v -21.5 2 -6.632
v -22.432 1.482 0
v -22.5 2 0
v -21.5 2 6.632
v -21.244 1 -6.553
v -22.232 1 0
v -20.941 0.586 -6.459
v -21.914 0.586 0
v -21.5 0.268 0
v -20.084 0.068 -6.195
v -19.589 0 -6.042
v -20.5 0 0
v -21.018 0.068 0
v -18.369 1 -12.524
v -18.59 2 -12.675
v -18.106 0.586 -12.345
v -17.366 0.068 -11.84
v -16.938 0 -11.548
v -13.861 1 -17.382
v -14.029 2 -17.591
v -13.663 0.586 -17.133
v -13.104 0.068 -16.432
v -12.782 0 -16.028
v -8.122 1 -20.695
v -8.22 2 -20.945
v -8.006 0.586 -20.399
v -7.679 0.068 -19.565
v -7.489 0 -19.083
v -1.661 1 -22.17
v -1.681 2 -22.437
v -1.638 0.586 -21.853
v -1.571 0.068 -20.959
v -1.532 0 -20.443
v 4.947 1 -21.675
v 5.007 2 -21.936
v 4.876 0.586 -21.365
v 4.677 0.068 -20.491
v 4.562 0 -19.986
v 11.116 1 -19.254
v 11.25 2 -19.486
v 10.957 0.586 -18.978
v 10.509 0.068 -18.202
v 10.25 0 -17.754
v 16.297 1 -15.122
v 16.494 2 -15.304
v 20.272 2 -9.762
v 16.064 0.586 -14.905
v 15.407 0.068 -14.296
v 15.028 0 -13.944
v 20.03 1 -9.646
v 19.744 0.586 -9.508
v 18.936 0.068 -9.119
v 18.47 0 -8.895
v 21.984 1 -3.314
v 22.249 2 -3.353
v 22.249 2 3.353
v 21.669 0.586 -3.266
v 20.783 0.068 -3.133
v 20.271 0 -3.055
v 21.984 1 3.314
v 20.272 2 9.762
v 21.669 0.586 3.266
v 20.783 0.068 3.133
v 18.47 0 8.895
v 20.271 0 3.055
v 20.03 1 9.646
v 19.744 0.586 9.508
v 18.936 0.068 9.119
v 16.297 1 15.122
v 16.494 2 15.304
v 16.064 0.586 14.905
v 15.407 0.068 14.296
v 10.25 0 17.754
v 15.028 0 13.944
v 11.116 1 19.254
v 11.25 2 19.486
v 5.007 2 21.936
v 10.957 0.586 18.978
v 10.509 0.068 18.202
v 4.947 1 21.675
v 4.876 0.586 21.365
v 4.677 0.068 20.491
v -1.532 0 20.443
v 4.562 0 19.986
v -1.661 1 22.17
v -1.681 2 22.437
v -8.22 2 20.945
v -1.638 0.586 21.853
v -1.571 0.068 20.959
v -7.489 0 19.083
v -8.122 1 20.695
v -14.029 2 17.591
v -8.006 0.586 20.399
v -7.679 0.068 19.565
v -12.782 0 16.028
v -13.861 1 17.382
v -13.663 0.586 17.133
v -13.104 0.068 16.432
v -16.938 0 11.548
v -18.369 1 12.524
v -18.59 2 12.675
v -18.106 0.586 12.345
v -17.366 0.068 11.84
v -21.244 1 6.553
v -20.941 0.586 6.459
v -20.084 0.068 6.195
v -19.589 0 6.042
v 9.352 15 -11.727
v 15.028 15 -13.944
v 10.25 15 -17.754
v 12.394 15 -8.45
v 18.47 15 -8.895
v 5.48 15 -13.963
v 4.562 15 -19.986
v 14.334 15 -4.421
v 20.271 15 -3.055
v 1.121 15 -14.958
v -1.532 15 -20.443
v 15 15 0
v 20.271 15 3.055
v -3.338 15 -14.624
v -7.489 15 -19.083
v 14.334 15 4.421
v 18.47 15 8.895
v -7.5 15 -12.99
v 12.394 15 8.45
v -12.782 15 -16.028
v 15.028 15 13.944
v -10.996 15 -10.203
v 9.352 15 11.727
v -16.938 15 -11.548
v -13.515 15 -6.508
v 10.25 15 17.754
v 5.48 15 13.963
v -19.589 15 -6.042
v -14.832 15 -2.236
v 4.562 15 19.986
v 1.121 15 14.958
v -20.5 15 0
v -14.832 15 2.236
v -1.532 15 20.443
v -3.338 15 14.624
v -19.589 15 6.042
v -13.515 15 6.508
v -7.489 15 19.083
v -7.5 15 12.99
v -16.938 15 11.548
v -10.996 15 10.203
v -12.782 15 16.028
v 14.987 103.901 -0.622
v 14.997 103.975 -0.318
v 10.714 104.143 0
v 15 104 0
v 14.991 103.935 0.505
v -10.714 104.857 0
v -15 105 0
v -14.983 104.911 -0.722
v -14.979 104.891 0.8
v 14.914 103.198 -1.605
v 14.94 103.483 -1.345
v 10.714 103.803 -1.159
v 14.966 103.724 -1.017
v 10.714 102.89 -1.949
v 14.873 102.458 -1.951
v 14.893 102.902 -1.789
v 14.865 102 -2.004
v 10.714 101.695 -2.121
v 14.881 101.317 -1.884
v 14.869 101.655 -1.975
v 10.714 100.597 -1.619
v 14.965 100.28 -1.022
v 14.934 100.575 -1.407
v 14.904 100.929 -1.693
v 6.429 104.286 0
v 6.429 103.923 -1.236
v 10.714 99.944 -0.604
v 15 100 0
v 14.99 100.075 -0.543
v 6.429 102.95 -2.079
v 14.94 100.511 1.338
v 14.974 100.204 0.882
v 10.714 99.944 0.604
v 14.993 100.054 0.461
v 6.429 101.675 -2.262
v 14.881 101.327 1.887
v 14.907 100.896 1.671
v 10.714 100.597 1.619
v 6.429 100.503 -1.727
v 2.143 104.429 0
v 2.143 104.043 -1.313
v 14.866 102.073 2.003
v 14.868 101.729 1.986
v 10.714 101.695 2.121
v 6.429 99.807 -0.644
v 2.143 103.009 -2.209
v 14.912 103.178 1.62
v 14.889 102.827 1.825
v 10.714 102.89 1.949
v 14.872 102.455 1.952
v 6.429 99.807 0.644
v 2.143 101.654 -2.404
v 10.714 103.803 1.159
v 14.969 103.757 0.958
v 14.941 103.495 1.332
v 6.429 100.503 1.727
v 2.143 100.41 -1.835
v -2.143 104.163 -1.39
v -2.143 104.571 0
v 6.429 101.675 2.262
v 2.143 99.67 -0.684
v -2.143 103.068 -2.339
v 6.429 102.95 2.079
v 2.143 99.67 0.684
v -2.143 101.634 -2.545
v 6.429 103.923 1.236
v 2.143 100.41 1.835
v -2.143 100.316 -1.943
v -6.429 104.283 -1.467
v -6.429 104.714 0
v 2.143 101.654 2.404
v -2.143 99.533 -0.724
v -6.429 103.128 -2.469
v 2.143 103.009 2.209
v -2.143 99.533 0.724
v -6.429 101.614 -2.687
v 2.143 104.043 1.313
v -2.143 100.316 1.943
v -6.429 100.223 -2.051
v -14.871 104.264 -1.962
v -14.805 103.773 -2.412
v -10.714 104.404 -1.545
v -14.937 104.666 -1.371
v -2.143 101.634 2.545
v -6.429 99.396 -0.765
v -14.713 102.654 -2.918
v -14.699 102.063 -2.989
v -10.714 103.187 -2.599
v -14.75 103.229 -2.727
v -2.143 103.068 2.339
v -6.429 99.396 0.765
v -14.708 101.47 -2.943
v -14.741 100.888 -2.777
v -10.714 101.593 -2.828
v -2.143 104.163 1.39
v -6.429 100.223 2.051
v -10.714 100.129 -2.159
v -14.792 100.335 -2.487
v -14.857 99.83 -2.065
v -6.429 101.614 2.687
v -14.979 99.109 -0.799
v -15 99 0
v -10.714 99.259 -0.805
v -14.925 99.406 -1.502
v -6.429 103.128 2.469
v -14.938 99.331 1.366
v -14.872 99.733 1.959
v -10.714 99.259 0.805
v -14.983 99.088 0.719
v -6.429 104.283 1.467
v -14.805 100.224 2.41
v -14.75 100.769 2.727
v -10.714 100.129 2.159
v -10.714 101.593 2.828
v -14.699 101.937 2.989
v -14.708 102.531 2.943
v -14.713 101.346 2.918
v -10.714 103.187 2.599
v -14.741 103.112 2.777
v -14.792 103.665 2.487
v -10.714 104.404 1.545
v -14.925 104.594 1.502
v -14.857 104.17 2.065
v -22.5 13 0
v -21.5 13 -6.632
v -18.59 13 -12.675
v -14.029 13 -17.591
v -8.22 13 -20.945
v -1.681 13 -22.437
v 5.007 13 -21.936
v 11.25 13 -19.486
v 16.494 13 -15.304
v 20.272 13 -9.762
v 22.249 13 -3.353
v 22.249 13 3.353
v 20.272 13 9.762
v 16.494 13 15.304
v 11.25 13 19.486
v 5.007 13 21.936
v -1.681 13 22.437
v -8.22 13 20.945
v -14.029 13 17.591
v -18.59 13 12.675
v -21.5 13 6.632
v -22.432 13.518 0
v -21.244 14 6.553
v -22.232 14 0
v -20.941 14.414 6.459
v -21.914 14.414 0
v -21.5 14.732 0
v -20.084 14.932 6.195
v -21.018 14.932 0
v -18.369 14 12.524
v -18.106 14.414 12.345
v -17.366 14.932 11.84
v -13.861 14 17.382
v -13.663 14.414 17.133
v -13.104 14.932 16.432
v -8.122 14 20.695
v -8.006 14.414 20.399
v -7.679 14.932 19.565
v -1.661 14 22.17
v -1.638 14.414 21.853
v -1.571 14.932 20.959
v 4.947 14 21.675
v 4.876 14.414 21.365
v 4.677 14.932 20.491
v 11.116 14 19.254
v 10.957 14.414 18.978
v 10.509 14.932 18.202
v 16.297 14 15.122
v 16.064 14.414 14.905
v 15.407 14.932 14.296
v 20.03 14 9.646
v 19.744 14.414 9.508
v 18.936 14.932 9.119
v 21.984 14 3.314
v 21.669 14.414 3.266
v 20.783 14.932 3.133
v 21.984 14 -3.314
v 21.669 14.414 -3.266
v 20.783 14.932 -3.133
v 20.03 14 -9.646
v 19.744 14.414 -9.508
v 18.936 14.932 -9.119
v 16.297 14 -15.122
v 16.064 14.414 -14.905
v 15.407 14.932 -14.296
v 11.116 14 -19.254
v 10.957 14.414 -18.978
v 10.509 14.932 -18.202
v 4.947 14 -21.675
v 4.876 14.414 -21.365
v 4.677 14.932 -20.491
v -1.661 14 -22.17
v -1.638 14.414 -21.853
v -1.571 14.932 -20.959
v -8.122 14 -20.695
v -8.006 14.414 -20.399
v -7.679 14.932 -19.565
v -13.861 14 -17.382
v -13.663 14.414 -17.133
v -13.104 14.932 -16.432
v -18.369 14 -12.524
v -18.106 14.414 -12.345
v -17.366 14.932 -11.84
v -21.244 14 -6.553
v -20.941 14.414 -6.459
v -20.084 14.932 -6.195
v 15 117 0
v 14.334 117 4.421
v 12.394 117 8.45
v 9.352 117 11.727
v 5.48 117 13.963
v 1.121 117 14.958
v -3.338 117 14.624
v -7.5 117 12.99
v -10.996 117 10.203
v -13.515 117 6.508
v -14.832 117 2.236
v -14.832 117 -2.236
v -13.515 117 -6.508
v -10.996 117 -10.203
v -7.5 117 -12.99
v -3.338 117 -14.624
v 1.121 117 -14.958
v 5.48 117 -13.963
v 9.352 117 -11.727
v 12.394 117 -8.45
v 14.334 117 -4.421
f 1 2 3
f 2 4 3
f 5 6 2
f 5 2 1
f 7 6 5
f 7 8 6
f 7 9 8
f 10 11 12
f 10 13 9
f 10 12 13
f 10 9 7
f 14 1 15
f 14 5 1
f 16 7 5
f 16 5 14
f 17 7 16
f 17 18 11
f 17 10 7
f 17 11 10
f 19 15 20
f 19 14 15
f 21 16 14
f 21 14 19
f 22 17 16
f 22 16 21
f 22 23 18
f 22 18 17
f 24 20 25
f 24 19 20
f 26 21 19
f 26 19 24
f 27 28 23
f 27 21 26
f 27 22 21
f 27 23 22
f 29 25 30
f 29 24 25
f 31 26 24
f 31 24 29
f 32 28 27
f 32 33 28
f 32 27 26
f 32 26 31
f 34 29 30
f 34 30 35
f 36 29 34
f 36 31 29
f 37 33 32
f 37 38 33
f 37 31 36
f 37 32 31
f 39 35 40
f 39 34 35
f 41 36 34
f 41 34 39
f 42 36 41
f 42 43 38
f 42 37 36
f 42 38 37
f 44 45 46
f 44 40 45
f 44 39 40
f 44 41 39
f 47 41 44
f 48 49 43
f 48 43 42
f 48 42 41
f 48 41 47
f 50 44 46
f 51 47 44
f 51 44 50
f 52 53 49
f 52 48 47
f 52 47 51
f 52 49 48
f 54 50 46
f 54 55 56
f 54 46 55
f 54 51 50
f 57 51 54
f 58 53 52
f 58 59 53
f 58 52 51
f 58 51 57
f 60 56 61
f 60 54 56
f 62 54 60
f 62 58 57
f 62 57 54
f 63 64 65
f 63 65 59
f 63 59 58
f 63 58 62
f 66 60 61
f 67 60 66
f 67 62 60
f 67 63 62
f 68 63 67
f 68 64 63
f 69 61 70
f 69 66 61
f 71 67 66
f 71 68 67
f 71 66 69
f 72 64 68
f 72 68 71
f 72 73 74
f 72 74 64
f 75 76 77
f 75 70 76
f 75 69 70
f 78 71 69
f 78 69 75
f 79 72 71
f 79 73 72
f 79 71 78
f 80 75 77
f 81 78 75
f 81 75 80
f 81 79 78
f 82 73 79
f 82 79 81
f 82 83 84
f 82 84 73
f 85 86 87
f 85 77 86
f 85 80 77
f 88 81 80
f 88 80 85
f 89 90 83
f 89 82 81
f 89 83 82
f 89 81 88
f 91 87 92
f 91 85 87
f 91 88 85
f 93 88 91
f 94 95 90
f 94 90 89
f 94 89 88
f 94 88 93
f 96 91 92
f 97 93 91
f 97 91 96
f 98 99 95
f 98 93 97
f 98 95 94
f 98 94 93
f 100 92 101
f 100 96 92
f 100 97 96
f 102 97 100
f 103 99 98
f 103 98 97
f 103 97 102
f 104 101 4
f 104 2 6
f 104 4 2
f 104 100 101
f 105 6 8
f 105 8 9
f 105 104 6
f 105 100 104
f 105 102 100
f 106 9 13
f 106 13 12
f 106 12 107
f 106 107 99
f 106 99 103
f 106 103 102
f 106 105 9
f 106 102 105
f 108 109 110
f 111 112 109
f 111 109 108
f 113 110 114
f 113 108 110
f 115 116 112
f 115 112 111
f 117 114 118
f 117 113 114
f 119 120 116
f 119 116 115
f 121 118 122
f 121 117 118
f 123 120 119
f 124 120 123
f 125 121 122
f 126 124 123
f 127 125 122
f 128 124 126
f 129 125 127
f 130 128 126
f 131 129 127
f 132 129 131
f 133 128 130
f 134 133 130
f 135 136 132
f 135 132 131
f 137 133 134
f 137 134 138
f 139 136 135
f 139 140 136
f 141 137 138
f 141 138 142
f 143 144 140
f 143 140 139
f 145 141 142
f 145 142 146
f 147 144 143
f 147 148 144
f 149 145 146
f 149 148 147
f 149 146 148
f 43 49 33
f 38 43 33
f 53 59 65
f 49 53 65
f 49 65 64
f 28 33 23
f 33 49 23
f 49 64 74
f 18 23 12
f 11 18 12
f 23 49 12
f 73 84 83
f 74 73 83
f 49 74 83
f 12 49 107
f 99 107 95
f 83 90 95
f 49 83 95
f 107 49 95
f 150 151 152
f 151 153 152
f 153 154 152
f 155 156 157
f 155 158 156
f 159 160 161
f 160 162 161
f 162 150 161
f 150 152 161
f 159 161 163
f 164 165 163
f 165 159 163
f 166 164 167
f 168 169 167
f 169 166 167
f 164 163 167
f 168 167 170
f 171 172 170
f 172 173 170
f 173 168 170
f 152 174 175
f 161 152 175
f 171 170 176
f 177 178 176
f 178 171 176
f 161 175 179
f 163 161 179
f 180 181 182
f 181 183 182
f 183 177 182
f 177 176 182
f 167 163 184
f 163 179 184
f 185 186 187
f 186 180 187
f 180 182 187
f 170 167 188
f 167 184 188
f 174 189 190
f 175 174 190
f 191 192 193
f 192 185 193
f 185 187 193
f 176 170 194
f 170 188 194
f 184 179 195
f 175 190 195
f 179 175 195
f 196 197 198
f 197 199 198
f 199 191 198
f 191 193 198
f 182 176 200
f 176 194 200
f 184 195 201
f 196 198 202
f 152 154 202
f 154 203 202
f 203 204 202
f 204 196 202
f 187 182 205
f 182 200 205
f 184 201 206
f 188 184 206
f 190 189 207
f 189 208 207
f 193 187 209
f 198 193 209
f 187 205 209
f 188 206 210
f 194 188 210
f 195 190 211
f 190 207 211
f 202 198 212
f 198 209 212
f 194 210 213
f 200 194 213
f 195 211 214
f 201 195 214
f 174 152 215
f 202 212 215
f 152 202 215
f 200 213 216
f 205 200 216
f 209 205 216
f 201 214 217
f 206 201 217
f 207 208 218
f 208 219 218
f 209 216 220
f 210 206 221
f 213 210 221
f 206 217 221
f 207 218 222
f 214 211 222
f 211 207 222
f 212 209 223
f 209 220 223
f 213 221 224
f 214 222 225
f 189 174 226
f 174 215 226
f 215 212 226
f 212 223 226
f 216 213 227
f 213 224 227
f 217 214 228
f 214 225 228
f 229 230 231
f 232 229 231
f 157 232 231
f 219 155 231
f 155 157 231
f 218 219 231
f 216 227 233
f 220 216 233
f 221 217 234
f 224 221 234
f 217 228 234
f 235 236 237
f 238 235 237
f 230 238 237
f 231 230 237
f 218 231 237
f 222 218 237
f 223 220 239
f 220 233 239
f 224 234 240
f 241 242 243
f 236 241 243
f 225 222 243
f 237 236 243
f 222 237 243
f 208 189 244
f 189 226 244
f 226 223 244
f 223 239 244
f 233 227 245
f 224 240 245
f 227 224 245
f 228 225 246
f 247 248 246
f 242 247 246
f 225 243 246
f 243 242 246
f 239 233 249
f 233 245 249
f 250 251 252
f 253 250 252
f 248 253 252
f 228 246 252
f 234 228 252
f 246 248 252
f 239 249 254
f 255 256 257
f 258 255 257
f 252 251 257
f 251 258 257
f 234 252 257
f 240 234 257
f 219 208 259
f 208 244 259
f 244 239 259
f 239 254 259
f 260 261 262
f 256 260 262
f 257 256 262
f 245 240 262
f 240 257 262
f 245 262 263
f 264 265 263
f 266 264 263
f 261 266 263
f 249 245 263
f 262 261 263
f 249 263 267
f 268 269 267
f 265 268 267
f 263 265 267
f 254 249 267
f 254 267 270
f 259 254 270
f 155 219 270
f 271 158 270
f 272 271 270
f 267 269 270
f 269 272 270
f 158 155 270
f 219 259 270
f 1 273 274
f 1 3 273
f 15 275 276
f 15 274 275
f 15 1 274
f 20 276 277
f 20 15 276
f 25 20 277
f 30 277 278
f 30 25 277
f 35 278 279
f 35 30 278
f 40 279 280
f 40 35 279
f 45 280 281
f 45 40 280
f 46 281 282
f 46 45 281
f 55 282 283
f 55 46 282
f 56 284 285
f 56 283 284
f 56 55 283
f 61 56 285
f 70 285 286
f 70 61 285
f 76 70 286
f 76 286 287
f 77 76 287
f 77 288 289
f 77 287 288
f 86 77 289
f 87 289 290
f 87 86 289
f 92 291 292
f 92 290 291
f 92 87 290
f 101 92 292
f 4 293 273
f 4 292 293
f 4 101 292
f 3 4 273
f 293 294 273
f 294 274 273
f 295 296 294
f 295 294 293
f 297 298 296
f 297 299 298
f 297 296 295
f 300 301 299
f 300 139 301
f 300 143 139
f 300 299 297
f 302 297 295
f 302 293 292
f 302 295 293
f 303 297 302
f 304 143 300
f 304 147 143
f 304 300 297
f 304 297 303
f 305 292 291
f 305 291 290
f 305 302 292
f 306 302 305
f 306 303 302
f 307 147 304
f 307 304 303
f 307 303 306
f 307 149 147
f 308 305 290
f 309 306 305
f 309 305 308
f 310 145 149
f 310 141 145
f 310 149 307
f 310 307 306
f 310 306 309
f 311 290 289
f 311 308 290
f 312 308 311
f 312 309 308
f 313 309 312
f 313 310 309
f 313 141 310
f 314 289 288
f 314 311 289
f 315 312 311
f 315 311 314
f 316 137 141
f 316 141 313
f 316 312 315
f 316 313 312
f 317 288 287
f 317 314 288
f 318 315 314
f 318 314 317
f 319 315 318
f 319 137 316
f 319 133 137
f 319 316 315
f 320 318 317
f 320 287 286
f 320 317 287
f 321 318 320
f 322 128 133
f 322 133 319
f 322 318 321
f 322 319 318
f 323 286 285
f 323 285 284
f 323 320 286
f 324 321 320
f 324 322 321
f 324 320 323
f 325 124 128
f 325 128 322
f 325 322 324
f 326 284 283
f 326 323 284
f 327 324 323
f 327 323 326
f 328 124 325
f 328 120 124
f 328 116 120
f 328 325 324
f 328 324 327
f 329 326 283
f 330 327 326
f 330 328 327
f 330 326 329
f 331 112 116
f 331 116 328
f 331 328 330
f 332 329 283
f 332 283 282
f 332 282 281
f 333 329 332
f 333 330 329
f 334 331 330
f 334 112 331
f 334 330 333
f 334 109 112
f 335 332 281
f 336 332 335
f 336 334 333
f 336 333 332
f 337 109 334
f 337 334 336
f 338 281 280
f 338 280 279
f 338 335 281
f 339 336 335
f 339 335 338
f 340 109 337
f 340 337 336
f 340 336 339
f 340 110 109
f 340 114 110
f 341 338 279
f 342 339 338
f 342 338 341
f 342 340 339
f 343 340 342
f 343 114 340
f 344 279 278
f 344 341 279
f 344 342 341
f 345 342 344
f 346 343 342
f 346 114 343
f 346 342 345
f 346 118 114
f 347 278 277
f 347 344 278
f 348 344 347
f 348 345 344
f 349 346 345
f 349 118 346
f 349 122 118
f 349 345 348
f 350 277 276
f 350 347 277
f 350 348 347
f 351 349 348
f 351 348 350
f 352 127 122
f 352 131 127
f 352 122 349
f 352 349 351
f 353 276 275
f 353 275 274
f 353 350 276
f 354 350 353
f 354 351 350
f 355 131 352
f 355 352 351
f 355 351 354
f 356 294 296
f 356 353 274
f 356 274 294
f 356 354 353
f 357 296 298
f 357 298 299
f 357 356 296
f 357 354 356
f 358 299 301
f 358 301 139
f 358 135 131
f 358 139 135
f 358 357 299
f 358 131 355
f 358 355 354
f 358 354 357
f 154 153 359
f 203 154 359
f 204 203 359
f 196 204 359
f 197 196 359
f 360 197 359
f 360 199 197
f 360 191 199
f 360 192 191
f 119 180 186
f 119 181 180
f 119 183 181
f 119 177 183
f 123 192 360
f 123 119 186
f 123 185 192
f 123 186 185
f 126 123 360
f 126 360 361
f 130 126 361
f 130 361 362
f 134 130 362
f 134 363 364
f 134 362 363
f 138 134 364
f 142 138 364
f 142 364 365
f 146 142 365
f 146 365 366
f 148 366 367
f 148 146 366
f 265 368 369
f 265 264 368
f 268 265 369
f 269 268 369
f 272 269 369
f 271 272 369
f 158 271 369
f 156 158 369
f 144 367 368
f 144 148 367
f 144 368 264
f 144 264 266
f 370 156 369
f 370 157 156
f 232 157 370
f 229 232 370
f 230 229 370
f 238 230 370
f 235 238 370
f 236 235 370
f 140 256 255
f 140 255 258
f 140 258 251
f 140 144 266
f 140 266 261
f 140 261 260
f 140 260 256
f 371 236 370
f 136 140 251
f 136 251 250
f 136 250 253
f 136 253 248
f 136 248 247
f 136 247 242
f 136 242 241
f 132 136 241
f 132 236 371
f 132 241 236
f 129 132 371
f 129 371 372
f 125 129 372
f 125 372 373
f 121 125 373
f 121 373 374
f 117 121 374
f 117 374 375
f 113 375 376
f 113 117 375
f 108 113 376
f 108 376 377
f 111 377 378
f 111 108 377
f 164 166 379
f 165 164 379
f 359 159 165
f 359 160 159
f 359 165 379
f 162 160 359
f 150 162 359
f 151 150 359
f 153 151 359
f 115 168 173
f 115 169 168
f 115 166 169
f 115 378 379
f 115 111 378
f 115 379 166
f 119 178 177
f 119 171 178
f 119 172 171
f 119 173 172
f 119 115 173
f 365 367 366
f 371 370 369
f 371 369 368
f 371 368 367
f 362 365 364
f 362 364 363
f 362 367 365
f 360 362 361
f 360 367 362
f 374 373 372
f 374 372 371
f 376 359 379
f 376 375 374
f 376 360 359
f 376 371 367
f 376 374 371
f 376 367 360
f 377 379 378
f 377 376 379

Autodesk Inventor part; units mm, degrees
ref_plane "YZ Plane" through (0, 0, 0) normal (1, 0, 0) x (0, 1, 0)
ref_plane "XZ Plane" through (0, 0, 0) normal (0, 1, 0) x (-1, 0, 0)
ref_plane "XY Plane" through (0, 0, 0) normal (0, 0, 1) x (1, 0, 0)
sketch "Sketch1" plane through (0, 0, 0) normal (0, 1, 0) x (-1, 0, 0)
  circle A0 centre (0, 0) radius 22.5
  dimension "d0" = 45
extrude "Extrusion1" add sketch "Sketch1" along normal blind 15
sketch "Sketch2" plane through (0, 15, 0) normal (0, 1, 0) x (1, 0, 0)
  circle A0 centre (0, 0) radius 15
  dimension "d3" = 30
extrude "Extrusion2" add sketch "Sketch2" along normal blind 102
sketch "Sketch3" plane through (0, 0, 0) normal (0, 0, 1) x (1, 0, 0)
  line L0 (-15, 15) -> (-15, 117) projected
  line L1 (-15, 102) -> (15, 102)
  line L2 (15, 15) -> (15, 117) projected
  line L3 (15, 117) -> (-15, 117) projected
  line L4 (-15, 102) -> (-15, 105)
  line L5 (15, 102) -> (15, 104)
  line L6 (15, 104) -> (-15, 105)
  point P0 (0, 0)
  dimension "d6" = 15
  dimension "d7" = 3
  dimension "d8" = 2
revolve "Revolution1" cut sketch "Sketch3" angle 360 about axis through (-15, 102, 0) along (1, 0, 0) contours L0 L6 L2 L1
fillet "Fillet1" radius 2 2 edges at (22.5, 15, 0) (22.5, 0, 0)
properties part number "pin"
